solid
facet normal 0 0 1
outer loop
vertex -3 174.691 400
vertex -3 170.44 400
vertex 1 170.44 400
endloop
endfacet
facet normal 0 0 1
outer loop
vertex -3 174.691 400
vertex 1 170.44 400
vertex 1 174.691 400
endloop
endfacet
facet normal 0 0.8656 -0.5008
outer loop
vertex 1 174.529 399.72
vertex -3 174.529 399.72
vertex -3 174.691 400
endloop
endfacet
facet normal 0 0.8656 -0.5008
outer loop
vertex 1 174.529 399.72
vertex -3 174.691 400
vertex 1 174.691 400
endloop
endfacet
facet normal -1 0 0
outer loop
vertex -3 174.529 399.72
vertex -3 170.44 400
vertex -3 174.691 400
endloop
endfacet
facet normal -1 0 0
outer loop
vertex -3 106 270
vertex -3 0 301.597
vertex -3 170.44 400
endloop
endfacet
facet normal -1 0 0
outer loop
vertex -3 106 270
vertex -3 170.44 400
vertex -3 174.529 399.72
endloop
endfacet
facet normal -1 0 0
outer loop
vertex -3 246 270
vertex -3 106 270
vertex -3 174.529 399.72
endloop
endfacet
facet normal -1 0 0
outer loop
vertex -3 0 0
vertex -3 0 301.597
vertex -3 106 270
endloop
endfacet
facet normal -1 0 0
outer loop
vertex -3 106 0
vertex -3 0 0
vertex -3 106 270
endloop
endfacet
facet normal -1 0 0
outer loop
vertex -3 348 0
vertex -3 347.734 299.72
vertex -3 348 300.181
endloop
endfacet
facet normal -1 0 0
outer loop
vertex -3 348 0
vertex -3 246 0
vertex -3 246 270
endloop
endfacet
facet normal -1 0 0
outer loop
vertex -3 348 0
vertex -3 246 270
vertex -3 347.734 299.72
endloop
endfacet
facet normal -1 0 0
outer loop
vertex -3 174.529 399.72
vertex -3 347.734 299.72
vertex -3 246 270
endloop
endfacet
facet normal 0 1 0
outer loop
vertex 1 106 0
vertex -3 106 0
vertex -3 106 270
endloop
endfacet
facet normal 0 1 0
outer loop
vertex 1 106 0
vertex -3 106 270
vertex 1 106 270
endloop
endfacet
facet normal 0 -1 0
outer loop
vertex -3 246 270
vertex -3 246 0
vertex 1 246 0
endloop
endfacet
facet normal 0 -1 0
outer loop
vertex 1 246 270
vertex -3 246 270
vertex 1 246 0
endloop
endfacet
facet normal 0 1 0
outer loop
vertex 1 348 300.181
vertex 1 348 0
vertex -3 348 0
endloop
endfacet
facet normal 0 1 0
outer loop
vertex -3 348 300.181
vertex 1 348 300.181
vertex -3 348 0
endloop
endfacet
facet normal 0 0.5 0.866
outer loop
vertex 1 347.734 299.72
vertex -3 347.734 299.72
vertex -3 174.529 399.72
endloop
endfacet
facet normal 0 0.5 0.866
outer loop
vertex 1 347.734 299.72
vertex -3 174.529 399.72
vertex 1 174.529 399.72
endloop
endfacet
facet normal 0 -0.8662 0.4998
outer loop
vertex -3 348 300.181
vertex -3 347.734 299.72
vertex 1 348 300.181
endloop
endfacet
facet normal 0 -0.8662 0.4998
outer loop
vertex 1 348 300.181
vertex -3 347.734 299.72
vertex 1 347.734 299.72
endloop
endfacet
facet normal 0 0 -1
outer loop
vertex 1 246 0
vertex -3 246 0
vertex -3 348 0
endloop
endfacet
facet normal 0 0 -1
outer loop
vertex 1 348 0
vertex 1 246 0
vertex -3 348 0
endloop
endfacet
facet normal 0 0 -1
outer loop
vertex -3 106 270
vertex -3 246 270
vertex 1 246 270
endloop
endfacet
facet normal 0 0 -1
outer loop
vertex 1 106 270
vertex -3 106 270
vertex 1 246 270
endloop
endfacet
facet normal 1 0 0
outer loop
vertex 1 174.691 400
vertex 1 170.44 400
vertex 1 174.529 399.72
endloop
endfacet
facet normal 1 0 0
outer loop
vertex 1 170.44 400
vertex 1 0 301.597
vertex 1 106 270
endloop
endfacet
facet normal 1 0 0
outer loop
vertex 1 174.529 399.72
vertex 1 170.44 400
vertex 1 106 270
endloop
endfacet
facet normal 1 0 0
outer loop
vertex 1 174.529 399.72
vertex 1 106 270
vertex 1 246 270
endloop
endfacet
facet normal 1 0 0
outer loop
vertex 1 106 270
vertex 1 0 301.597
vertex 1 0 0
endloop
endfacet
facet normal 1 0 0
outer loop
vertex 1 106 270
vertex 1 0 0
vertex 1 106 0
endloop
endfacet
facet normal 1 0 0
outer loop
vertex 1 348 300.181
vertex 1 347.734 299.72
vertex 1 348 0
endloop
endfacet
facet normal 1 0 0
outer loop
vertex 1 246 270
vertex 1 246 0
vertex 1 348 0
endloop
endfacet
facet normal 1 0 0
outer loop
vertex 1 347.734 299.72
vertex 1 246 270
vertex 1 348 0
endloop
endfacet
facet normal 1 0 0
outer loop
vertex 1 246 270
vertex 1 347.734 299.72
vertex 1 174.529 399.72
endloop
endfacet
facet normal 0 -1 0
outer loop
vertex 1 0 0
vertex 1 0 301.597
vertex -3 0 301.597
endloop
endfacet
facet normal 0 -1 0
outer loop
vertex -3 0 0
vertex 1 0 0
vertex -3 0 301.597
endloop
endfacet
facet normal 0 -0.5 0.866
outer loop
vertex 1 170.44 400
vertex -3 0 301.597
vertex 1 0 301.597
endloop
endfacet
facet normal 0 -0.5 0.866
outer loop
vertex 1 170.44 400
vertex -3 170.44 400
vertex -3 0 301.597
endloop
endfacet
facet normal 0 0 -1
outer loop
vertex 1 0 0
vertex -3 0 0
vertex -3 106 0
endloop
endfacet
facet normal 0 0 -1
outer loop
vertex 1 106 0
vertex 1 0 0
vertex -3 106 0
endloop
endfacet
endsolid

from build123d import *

# Parameters (mm, degrees)
BOX013_W               = 10
BOX013_H               = 140
BOX013_DEPTH           = 270
BOX009_W               = 18
BOX009_H               = 200
BOX009_DEPTH           = 87
BOX009_PLACEMENT_ANGLE = 30
BOX008_W               = 18
BOX008_H               = 200
BOX008_DEPTH           = 87
BOX008_PLACEMENT_ANGLE = 30
BOX007_W               = 348
BOX007_H               = 4
BOX007_DEPTH           = 400


with BuildPart() as door:
    # Box013 → Box013 (new body)
    with BuildSketch(Plane(origin=(-5, 106, 0), x_dir=(1, 0, 0), z_dir=(0, 0, 1))):
        with Locations((5, 70)):
            Rectangle(BOX013_W, BOX013_H)
    extrude(amount=BOX013_DEPTH)


with BuildPart() as box009:
    # Box009 → Box009 (new body)
    with BuildSketch(Plane.XY):
        with Locations((9, 100)):
            Rectangle(BOX009_W, BOX009_H)
    extrude(amount=BOX009_DEPTH)


with BuildPart() as box009_1:
    # Box009 placement: moved
    add(box009.part.moved(Location((598, 174.528857, 399.719854))).rotate(Axis((598, 174.528857, 399.719854), (-1, 0, 0)), BOX009_PLACEMENT_ANGLE))


with BuildPart() as box008:
    # Box008 → Box008 (new body)
    with BuildSketch(Plane.XY):
        with Locations((9, 100)):
            Rectangle(BOX008_W, BOX008_H)
    extrude(amount=BOX008_DEPTH)


with BuildPart() as box008_1:
    # Box008 placement: moved
    add(box008.part.moved(Location((598, -0.25833, 301.447441))).rotate(Axis((598, -0.25833, 301.447441), (1, 0, 0)), BOX008_PLACEMENT_ANGLE))


with BuildPart() as cut004:
    # Box007 → Box007 (new body)
    with BuildSketch(Plane(origin=(605, 0, 0), x_dir=(0, 1, 0), z_dir=(0, 0, 1))):
        with Locations((174, 2)):
            Rectangle(BOX007_W, BOX007_H)
    extrude(amount=BOX007_DEPTH)

    # Cut002: cut Box008
    add(box008_1.part, mode=Mode.SUBTRACT)

    # Cut003: cut Box009
    add(box009_1.part, mode=Mode.SUBTRACT)


with BuildPart() as cut004_1:
    # Cut003 placement: moved
    add(cut004.part.moved(Location((-604, 0, 0))))

    # Cut004: cut Door
    add(door.part, mode=Mode.SUBTRACT)


solid = cut004_1.part
